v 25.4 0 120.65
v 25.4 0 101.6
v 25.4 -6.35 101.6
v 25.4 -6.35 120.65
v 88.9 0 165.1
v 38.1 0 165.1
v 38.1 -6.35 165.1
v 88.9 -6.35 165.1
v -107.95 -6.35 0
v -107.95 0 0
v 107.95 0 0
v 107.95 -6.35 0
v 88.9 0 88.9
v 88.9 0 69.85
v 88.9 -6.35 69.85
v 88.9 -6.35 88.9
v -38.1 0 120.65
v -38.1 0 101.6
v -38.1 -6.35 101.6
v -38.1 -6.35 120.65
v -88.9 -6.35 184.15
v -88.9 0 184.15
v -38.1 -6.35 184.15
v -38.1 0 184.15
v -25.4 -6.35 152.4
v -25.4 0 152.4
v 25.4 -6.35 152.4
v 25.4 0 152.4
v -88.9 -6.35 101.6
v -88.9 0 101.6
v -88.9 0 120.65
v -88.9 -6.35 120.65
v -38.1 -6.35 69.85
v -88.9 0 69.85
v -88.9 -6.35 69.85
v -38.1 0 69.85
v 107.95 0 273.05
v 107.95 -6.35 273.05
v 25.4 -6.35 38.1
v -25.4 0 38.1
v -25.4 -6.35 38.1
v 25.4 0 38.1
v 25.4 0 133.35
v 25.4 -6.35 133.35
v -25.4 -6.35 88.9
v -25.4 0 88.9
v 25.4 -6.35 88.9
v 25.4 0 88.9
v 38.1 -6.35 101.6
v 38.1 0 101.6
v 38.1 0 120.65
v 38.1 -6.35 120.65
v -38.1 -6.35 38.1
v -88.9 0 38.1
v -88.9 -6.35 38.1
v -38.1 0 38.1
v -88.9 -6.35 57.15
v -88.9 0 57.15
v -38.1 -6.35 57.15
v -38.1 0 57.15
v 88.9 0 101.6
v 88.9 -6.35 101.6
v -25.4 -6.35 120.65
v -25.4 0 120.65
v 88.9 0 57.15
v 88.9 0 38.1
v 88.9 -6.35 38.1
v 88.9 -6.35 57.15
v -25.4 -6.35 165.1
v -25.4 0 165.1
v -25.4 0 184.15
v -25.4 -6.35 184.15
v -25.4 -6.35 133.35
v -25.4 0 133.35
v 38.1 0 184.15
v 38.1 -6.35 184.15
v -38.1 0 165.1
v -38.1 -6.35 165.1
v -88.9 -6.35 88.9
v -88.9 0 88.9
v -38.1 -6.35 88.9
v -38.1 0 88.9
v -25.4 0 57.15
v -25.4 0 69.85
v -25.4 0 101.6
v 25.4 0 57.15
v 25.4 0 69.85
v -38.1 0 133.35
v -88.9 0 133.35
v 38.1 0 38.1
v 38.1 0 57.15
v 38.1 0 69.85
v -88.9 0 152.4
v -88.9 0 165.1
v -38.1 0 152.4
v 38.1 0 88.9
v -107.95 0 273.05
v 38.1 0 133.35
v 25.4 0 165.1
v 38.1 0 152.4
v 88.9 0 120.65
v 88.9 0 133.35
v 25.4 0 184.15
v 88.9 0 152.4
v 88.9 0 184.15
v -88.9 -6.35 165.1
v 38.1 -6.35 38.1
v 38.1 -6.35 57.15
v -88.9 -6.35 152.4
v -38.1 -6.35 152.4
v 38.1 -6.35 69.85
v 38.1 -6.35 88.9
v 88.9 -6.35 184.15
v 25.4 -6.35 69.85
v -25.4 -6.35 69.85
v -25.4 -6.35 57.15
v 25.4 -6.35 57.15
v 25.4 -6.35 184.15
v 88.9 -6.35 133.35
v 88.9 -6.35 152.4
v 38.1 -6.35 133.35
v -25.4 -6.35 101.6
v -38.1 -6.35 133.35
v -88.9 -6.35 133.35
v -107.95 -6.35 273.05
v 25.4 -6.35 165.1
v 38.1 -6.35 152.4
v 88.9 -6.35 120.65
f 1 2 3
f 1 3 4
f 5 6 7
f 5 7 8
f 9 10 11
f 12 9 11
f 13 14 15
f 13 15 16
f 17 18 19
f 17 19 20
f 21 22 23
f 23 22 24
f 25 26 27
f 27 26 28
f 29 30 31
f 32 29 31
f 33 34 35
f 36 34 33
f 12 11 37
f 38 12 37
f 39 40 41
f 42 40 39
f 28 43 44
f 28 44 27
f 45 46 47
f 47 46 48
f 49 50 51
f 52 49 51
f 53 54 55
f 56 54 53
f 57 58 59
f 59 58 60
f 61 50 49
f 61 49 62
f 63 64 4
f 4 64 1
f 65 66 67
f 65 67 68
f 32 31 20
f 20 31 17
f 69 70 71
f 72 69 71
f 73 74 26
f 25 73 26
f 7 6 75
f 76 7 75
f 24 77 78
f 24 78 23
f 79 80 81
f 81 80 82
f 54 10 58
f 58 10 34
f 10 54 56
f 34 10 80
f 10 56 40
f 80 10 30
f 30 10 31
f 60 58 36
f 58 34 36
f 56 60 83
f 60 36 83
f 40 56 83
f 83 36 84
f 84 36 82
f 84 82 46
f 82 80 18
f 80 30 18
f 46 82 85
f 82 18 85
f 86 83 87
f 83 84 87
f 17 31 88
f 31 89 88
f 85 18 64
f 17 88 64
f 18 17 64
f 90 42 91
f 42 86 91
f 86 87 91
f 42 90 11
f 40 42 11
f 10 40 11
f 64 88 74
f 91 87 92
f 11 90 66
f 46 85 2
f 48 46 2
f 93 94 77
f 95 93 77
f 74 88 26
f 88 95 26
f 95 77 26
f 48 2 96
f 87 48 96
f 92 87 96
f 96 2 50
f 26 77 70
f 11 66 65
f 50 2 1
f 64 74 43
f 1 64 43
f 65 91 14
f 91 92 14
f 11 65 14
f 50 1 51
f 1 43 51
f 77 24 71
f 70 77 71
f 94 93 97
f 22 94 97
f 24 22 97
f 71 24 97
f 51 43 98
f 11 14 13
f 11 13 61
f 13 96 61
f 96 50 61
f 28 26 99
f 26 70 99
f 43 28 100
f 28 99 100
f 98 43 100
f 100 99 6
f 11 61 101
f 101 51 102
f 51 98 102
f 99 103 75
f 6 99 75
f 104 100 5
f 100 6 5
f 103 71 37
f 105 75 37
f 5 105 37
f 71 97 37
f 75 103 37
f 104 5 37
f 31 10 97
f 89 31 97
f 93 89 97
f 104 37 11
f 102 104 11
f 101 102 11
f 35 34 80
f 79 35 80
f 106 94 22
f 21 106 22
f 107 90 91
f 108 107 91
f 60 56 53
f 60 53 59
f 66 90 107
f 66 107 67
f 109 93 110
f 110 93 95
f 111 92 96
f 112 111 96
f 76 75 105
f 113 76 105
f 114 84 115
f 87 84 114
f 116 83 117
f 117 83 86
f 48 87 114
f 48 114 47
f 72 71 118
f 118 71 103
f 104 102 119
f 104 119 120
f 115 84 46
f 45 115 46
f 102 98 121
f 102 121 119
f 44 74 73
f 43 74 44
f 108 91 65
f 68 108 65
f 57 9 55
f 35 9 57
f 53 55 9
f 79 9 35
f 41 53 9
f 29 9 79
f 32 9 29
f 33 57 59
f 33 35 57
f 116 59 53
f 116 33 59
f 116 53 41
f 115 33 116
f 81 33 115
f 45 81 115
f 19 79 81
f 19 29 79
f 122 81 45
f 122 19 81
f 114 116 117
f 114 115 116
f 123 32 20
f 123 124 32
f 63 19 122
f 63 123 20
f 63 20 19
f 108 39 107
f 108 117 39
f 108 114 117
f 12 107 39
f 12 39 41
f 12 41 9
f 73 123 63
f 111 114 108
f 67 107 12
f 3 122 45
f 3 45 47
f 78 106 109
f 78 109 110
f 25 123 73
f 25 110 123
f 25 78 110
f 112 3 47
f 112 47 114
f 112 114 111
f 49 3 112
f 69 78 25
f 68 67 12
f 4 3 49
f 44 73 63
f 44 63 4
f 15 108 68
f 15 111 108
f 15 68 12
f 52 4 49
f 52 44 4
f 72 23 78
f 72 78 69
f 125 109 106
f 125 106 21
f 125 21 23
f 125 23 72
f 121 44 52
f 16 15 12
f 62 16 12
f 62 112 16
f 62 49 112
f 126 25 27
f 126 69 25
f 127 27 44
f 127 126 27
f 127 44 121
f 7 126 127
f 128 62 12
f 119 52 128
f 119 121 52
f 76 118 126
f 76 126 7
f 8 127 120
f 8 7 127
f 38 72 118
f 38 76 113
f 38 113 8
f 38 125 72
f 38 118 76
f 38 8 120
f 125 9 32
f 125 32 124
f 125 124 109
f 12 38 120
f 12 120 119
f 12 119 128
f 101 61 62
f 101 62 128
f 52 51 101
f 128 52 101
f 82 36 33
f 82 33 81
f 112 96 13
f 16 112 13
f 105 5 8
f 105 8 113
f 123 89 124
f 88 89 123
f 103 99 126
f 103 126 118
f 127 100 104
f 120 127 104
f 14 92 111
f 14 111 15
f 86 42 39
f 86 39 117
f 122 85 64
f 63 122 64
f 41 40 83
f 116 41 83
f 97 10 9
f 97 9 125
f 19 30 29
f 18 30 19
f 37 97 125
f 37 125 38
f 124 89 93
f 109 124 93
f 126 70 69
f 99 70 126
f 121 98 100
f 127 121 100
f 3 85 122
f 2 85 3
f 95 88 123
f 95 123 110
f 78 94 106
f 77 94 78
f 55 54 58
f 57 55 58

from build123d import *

# Parameters (mm, degrees)
F0_W     = 215.9
F0_H     = 273.05
F0_W_2   = 50.8
F0_H_2   = 19.05
F1_DEPTH = 6.35


with BuildPart() as f1:
    # F0 (on Front) → F1 (new body)
    with BuildSketch(Plane.XZ):
        with Locations((0, 136.525)):
            Rectangle(F0_W, F0_H)
        with Locations((-63.5, 47.625)):
            Rectangle(F0_W_2, F0_H_2, mode=Mode.SUBTRACT)
        with Locations((-63.5, 79.375)):
            Rectangle(F0_W_2, F0_H_2, mode=Mode.SUBTRACT)
        with Locations((-63.5, 111.125)):
            Rectangle(F0_W_2, F0_H_2, mode=Mode.SUBTRACT)
        with Locations((0, 47.625)):
            Rectangle(F0_W_2, F0_H_2, mode=Mode.SUBTRACT)
        with Locations((63.5, 47.625)):
            Rectangle(F0_W_2, F0_H_2, mode=Mode.SUBTRACT)
        with Locations((0, 79.375)):
            Rectangle(F0_W_2, F0_H_2, mode=Mode.SUBTRACT)
        with Locations((0, 111.125)):
            Rectangle(F0_W_2, F0_H_2, mode=Mode.SUBTRACT)
        with Locations((63.5, 79.375)):
            Rectangle(F0_W_2, F0_H_2, mode=Mode.SUBTRACT)
        with Locations((63.5, 111.125)):
            Rectangle(F0_W_2, F0_H_2, mode=Mode.SUBTRACT)
        with Locations((-63.5, 142.875)):
            Rectangle(F0_W_2, F0_H_2, mode=Mode.SUBTRACT)
        with Locations((-63.5, 174.625)):
            Rectangle(F0_W_2, F0_H_2, mode=Mode.SUBTRACT)
        with Locations((0, 142.875)):
            Rectangle(F0_W_2, F0_H_2, mode=Mode.SUBTRACT)
        with Locations((0, 174.625)):
            Rectangle(F0_W_2, F0_H_2, mode=Mode.SUBTRACT)
        with Locations((63.5, 142.875)):
            Rectangle(F0_W_2, F0_H_2, mode=Mode.SUBTRACT)
        with Locations((63.5, 174.625)):
            Rectangle(F0_W_2, F0_H_2, mode=Mode.SUBTRACT)
    extrude(amount=F1_DEPTH)


solid = f1.part
